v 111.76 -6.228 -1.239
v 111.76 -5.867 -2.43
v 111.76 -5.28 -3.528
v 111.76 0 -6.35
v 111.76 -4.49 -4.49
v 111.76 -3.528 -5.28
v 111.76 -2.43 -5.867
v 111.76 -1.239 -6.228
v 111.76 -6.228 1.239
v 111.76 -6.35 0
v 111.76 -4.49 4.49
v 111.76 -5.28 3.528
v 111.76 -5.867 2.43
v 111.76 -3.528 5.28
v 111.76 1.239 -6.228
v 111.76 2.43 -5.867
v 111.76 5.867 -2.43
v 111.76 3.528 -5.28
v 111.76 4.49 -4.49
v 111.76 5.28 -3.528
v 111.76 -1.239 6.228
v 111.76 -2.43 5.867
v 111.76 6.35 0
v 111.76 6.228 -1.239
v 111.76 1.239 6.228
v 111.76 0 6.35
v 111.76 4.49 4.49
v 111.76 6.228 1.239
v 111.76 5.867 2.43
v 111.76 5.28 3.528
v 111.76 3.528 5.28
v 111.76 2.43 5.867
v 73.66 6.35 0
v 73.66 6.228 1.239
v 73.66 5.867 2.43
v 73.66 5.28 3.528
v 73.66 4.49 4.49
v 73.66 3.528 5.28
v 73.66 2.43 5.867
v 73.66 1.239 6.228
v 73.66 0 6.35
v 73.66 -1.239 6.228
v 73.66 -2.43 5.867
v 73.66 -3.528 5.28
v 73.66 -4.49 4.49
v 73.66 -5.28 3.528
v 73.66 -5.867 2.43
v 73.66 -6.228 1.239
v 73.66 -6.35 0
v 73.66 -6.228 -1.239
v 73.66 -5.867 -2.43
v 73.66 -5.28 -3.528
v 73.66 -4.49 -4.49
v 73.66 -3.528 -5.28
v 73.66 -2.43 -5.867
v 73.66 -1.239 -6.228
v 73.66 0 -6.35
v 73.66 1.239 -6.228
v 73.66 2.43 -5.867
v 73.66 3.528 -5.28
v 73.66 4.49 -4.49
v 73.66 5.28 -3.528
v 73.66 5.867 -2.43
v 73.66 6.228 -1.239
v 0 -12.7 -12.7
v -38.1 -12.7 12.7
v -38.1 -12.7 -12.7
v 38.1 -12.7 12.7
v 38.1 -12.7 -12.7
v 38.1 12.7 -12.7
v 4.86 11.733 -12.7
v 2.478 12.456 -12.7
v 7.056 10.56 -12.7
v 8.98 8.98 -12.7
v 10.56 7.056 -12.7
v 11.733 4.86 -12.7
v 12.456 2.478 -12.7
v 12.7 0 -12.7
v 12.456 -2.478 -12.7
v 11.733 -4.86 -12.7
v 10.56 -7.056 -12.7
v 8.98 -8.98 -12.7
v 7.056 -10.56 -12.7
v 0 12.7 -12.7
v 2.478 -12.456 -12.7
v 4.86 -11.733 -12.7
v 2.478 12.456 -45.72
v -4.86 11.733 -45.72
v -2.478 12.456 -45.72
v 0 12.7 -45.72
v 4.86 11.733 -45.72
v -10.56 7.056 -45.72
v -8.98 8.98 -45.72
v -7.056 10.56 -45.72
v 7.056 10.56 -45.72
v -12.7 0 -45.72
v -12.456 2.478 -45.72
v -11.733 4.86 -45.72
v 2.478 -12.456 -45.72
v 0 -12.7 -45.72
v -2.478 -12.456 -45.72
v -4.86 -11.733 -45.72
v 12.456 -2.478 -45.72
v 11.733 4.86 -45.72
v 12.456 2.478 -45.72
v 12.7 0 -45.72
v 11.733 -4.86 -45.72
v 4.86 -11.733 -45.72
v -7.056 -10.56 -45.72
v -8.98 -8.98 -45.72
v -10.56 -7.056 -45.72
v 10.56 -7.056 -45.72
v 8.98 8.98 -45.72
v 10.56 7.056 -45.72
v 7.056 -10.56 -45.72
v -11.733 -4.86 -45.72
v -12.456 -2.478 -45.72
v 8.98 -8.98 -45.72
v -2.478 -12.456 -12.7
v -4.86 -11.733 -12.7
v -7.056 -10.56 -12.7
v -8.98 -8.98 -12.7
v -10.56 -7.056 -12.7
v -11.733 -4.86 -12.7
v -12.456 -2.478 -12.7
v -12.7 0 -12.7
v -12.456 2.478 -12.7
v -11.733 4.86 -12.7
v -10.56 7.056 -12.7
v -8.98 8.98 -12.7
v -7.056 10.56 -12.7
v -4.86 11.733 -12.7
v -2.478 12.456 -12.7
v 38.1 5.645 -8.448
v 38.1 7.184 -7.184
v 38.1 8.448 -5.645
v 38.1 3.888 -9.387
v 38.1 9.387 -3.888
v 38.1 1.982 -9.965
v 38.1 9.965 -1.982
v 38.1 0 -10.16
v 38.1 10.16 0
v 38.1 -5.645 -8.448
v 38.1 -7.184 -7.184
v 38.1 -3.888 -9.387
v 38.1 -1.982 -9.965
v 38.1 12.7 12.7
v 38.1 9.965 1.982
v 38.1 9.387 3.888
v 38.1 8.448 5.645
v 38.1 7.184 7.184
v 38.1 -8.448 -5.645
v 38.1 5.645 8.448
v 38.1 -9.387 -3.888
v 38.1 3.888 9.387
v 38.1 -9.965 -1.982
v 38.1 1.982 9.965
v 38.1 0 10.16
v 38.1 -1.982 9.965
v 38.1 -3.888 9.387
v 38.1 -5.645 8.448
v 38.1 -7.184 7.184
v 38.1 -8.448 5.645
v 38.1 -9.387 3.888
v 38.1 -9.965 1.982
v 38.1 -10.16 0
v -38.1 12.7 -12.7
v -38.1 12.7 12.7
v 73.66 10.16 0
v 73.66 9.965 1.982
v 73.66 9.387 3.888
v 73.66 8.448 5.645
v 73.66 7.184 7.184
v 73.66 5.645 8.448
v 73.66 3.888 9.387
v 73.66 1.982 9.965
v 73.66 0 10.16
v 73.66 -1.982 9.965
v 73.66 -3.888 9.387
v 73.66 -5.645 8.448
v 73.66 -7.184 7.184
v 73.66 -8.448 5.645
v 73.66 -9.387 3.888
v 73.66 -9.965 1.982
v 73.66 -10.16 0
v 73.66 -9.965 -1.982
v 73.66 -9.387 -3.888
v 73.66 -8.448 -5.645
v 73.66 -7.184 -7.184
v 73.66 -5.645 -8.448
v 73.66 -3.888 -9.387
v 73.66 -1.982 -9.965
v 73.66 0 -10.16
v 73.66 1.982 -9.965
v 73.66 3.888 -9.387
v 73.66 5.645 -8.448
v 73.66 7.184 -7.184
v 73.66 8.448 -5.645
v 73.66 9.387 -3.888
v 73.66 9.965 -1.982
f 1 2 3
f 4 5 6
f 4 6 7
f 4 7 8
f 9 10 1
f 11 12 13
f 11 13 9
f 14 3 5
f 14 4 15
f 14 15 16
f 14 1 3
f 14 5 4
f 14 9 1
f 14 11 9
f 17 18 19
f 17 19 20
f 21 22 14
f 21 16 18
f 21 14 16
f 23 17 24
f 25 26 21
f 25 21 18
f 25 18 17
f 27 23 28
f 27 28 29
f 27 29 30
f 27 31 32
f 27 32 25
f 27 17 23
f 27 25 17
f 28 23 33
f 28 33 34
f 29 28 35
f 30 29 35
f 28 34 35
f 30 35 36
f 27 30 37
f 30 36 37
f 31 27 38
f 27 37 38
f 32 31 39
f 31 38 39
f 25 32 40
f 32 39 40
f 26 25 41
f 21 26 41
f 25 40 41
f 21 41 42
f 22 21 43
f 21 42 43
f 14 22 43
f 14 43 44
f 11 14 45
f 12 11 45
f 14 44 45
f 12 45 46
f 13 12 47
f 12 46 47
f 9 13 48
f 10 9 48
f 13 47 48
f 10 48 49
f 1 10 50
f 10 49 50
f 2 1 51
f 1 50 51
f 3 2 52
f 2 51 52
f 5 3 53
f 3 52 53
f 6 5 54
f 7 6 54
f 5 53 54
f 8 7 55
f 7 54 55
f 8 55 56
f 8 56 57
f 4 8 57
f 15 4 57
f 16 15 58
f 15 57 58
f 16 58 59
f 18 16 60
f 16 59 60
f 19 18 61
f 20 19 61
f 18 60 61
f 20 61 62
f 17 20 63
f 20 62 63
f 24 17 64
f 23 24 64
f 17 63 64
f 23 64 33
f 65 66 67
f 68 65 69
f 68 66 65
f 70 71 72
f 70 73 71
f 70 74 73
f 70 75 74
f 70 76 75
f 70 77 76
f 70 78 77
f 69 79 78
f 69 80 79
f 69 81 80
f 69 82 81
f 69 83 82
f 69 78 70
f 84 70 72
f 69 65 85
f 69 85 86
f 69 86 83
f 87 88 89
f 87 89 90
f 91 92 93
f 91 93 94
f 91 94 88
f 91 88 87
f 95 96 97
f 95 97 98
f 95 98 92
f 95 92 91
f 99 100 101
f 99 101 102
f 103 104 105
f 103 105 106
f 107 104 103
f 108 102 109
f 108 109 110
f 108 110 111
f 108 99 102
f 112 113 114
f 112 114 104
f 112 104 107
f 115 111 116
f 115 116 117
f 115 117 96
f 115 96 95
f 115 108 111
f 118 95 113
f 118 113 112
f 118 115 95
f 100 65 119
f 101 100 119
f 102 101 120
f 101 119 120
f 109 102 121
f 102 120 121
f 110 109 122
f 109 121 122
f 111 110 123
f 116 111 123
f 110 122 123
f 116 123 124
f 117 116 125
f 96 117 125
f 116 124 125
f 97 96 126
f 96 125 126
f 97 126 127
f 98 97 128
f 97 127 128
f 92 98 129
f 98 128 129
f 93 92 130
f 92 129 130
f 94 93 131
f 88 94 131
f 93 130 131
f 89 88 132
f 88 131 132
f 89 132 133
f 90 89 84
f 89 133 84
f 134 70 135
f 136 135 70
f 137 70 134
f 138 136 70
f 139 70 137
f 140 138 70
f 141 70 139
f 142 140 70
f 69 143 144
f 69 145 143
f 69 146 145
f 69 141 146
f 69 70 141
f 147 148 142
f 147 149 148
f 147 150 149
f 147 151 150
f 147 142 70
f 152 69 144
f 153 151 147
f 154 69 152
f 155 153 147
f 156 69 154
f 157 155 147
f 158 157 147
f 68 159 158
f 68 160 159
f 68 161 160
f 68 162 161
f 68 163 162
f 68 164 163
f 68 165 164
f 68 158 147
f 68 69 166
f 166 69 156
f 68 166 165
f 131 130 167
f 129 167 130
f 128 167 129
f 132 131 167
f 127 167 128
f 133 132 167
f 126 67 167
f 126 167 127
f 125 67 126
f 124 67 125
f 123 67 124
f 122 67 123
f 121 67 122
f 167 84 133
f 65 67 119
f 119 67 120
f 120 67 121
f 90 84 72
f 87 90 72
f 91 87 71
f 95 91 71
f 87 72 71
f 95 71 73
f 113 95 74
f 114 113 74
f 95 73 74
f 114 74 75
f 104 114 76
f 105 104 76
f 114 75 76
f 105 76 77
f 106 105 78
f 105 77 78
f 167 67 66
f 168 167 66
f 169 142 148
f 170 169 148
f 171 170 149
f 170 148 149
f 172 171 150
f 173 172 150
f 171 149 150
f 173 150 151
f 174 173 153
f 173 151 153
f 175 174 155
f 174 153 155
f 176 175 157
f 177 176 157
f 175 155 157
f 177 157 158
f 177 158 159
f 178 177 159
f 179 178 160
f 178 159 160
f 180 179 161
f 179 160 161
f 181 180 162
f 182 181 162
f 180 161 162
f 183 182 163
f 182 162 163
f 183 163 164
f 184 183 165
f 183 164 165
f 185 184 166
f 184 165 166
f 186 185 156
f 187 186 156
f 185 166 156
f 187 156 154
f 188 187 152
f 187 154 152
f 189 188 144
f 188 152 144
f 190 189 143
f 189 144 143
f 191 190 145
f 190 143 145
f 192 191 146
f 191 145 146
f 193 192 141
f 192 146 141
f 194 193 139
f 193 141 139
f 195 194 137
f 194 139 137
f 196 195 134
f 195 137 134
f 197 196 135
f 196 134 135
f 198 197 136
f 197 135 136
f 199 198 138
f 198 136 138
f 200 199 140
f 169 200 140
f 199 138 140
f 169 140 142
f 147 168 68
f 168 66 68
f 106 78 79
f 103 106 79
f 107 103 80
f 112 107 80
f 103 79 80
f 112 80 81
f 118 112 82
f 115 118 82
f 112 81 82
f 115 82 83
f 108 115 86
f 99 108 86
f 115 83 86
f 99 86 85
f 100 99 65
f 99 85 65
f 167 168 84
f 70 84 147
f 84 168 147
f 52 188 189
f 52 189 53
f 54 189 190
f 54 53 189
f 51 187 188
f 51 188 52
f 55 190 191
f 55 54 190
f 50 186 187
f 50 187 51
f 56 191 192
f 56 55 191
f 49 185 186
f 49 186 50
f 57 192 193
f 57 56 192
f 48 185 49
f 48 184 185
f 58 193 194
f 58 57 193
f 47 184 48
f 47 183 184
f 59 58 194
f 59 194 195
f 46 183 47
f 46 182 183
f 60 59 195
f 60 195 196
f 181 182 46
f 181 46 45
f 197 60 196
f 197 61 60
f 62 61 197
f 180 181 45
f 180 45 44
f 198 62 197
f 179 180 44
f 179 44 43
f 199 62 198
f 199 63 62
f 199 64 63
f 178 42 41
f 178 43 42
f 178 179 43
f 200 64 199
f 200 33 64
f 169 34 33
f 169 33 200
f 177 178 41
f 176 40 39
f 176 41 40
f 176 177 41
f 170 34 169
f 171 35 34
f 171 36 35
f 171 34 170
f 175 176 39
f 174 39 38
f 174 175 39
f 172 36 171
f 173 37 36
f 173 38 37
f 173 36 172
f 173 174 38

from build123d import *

# Parameters (mm, degrees)
F0_W     = 76.2
F0_H     = 25.4
F1_DEPTH = 12.7
F3_DEPTH = 33.02
F4_R     = 10.16
F5_DEPTH = 35.56
F6_R     = 6.35
F7_DEPTH = 38.1


with BuildPart() as f1:
    # F0 (on Front) → F1 (new body, symmetric)
    with BuildSketch(Plane.XZ):
        Rectangle(F0_W, F0_H)
    extrude(amount=F1_DEPTH, both=True)

    # F2 (on face) → F3 (join)
    with BuildSketch(Plane(origin=(0, 0, -12.7), x_dir=(1, 0, 0), z_dir=(0, 0, -1))):
        with BuildLine():
            ThreePointArc((0, -12.7), (8.980256, -8.980256), (12.7, 0))
            ThreePointArc((12.7, 0), (8.980256, 8.980256), (0, 12.7))
            ThreePointArc((0, 12.7), (-12.7, 0), (0, -12.7))
        make_face()
    extrude(amount=F3_DEPTH)

    # F4 (on face) → F5 (join)
    with BuildSketch(Plane.YZ.offset(38.1)):
        Circle(F4_R)
    extrude(amount=F5_DEPTH)

    # F6 (on face) → F7 (join)
    with BuildSketch(Plane.YZ.offset(73.66)):
        Circle(F6_R)
    extrude(amount=F7_DEPTH)


solid = f1.part
